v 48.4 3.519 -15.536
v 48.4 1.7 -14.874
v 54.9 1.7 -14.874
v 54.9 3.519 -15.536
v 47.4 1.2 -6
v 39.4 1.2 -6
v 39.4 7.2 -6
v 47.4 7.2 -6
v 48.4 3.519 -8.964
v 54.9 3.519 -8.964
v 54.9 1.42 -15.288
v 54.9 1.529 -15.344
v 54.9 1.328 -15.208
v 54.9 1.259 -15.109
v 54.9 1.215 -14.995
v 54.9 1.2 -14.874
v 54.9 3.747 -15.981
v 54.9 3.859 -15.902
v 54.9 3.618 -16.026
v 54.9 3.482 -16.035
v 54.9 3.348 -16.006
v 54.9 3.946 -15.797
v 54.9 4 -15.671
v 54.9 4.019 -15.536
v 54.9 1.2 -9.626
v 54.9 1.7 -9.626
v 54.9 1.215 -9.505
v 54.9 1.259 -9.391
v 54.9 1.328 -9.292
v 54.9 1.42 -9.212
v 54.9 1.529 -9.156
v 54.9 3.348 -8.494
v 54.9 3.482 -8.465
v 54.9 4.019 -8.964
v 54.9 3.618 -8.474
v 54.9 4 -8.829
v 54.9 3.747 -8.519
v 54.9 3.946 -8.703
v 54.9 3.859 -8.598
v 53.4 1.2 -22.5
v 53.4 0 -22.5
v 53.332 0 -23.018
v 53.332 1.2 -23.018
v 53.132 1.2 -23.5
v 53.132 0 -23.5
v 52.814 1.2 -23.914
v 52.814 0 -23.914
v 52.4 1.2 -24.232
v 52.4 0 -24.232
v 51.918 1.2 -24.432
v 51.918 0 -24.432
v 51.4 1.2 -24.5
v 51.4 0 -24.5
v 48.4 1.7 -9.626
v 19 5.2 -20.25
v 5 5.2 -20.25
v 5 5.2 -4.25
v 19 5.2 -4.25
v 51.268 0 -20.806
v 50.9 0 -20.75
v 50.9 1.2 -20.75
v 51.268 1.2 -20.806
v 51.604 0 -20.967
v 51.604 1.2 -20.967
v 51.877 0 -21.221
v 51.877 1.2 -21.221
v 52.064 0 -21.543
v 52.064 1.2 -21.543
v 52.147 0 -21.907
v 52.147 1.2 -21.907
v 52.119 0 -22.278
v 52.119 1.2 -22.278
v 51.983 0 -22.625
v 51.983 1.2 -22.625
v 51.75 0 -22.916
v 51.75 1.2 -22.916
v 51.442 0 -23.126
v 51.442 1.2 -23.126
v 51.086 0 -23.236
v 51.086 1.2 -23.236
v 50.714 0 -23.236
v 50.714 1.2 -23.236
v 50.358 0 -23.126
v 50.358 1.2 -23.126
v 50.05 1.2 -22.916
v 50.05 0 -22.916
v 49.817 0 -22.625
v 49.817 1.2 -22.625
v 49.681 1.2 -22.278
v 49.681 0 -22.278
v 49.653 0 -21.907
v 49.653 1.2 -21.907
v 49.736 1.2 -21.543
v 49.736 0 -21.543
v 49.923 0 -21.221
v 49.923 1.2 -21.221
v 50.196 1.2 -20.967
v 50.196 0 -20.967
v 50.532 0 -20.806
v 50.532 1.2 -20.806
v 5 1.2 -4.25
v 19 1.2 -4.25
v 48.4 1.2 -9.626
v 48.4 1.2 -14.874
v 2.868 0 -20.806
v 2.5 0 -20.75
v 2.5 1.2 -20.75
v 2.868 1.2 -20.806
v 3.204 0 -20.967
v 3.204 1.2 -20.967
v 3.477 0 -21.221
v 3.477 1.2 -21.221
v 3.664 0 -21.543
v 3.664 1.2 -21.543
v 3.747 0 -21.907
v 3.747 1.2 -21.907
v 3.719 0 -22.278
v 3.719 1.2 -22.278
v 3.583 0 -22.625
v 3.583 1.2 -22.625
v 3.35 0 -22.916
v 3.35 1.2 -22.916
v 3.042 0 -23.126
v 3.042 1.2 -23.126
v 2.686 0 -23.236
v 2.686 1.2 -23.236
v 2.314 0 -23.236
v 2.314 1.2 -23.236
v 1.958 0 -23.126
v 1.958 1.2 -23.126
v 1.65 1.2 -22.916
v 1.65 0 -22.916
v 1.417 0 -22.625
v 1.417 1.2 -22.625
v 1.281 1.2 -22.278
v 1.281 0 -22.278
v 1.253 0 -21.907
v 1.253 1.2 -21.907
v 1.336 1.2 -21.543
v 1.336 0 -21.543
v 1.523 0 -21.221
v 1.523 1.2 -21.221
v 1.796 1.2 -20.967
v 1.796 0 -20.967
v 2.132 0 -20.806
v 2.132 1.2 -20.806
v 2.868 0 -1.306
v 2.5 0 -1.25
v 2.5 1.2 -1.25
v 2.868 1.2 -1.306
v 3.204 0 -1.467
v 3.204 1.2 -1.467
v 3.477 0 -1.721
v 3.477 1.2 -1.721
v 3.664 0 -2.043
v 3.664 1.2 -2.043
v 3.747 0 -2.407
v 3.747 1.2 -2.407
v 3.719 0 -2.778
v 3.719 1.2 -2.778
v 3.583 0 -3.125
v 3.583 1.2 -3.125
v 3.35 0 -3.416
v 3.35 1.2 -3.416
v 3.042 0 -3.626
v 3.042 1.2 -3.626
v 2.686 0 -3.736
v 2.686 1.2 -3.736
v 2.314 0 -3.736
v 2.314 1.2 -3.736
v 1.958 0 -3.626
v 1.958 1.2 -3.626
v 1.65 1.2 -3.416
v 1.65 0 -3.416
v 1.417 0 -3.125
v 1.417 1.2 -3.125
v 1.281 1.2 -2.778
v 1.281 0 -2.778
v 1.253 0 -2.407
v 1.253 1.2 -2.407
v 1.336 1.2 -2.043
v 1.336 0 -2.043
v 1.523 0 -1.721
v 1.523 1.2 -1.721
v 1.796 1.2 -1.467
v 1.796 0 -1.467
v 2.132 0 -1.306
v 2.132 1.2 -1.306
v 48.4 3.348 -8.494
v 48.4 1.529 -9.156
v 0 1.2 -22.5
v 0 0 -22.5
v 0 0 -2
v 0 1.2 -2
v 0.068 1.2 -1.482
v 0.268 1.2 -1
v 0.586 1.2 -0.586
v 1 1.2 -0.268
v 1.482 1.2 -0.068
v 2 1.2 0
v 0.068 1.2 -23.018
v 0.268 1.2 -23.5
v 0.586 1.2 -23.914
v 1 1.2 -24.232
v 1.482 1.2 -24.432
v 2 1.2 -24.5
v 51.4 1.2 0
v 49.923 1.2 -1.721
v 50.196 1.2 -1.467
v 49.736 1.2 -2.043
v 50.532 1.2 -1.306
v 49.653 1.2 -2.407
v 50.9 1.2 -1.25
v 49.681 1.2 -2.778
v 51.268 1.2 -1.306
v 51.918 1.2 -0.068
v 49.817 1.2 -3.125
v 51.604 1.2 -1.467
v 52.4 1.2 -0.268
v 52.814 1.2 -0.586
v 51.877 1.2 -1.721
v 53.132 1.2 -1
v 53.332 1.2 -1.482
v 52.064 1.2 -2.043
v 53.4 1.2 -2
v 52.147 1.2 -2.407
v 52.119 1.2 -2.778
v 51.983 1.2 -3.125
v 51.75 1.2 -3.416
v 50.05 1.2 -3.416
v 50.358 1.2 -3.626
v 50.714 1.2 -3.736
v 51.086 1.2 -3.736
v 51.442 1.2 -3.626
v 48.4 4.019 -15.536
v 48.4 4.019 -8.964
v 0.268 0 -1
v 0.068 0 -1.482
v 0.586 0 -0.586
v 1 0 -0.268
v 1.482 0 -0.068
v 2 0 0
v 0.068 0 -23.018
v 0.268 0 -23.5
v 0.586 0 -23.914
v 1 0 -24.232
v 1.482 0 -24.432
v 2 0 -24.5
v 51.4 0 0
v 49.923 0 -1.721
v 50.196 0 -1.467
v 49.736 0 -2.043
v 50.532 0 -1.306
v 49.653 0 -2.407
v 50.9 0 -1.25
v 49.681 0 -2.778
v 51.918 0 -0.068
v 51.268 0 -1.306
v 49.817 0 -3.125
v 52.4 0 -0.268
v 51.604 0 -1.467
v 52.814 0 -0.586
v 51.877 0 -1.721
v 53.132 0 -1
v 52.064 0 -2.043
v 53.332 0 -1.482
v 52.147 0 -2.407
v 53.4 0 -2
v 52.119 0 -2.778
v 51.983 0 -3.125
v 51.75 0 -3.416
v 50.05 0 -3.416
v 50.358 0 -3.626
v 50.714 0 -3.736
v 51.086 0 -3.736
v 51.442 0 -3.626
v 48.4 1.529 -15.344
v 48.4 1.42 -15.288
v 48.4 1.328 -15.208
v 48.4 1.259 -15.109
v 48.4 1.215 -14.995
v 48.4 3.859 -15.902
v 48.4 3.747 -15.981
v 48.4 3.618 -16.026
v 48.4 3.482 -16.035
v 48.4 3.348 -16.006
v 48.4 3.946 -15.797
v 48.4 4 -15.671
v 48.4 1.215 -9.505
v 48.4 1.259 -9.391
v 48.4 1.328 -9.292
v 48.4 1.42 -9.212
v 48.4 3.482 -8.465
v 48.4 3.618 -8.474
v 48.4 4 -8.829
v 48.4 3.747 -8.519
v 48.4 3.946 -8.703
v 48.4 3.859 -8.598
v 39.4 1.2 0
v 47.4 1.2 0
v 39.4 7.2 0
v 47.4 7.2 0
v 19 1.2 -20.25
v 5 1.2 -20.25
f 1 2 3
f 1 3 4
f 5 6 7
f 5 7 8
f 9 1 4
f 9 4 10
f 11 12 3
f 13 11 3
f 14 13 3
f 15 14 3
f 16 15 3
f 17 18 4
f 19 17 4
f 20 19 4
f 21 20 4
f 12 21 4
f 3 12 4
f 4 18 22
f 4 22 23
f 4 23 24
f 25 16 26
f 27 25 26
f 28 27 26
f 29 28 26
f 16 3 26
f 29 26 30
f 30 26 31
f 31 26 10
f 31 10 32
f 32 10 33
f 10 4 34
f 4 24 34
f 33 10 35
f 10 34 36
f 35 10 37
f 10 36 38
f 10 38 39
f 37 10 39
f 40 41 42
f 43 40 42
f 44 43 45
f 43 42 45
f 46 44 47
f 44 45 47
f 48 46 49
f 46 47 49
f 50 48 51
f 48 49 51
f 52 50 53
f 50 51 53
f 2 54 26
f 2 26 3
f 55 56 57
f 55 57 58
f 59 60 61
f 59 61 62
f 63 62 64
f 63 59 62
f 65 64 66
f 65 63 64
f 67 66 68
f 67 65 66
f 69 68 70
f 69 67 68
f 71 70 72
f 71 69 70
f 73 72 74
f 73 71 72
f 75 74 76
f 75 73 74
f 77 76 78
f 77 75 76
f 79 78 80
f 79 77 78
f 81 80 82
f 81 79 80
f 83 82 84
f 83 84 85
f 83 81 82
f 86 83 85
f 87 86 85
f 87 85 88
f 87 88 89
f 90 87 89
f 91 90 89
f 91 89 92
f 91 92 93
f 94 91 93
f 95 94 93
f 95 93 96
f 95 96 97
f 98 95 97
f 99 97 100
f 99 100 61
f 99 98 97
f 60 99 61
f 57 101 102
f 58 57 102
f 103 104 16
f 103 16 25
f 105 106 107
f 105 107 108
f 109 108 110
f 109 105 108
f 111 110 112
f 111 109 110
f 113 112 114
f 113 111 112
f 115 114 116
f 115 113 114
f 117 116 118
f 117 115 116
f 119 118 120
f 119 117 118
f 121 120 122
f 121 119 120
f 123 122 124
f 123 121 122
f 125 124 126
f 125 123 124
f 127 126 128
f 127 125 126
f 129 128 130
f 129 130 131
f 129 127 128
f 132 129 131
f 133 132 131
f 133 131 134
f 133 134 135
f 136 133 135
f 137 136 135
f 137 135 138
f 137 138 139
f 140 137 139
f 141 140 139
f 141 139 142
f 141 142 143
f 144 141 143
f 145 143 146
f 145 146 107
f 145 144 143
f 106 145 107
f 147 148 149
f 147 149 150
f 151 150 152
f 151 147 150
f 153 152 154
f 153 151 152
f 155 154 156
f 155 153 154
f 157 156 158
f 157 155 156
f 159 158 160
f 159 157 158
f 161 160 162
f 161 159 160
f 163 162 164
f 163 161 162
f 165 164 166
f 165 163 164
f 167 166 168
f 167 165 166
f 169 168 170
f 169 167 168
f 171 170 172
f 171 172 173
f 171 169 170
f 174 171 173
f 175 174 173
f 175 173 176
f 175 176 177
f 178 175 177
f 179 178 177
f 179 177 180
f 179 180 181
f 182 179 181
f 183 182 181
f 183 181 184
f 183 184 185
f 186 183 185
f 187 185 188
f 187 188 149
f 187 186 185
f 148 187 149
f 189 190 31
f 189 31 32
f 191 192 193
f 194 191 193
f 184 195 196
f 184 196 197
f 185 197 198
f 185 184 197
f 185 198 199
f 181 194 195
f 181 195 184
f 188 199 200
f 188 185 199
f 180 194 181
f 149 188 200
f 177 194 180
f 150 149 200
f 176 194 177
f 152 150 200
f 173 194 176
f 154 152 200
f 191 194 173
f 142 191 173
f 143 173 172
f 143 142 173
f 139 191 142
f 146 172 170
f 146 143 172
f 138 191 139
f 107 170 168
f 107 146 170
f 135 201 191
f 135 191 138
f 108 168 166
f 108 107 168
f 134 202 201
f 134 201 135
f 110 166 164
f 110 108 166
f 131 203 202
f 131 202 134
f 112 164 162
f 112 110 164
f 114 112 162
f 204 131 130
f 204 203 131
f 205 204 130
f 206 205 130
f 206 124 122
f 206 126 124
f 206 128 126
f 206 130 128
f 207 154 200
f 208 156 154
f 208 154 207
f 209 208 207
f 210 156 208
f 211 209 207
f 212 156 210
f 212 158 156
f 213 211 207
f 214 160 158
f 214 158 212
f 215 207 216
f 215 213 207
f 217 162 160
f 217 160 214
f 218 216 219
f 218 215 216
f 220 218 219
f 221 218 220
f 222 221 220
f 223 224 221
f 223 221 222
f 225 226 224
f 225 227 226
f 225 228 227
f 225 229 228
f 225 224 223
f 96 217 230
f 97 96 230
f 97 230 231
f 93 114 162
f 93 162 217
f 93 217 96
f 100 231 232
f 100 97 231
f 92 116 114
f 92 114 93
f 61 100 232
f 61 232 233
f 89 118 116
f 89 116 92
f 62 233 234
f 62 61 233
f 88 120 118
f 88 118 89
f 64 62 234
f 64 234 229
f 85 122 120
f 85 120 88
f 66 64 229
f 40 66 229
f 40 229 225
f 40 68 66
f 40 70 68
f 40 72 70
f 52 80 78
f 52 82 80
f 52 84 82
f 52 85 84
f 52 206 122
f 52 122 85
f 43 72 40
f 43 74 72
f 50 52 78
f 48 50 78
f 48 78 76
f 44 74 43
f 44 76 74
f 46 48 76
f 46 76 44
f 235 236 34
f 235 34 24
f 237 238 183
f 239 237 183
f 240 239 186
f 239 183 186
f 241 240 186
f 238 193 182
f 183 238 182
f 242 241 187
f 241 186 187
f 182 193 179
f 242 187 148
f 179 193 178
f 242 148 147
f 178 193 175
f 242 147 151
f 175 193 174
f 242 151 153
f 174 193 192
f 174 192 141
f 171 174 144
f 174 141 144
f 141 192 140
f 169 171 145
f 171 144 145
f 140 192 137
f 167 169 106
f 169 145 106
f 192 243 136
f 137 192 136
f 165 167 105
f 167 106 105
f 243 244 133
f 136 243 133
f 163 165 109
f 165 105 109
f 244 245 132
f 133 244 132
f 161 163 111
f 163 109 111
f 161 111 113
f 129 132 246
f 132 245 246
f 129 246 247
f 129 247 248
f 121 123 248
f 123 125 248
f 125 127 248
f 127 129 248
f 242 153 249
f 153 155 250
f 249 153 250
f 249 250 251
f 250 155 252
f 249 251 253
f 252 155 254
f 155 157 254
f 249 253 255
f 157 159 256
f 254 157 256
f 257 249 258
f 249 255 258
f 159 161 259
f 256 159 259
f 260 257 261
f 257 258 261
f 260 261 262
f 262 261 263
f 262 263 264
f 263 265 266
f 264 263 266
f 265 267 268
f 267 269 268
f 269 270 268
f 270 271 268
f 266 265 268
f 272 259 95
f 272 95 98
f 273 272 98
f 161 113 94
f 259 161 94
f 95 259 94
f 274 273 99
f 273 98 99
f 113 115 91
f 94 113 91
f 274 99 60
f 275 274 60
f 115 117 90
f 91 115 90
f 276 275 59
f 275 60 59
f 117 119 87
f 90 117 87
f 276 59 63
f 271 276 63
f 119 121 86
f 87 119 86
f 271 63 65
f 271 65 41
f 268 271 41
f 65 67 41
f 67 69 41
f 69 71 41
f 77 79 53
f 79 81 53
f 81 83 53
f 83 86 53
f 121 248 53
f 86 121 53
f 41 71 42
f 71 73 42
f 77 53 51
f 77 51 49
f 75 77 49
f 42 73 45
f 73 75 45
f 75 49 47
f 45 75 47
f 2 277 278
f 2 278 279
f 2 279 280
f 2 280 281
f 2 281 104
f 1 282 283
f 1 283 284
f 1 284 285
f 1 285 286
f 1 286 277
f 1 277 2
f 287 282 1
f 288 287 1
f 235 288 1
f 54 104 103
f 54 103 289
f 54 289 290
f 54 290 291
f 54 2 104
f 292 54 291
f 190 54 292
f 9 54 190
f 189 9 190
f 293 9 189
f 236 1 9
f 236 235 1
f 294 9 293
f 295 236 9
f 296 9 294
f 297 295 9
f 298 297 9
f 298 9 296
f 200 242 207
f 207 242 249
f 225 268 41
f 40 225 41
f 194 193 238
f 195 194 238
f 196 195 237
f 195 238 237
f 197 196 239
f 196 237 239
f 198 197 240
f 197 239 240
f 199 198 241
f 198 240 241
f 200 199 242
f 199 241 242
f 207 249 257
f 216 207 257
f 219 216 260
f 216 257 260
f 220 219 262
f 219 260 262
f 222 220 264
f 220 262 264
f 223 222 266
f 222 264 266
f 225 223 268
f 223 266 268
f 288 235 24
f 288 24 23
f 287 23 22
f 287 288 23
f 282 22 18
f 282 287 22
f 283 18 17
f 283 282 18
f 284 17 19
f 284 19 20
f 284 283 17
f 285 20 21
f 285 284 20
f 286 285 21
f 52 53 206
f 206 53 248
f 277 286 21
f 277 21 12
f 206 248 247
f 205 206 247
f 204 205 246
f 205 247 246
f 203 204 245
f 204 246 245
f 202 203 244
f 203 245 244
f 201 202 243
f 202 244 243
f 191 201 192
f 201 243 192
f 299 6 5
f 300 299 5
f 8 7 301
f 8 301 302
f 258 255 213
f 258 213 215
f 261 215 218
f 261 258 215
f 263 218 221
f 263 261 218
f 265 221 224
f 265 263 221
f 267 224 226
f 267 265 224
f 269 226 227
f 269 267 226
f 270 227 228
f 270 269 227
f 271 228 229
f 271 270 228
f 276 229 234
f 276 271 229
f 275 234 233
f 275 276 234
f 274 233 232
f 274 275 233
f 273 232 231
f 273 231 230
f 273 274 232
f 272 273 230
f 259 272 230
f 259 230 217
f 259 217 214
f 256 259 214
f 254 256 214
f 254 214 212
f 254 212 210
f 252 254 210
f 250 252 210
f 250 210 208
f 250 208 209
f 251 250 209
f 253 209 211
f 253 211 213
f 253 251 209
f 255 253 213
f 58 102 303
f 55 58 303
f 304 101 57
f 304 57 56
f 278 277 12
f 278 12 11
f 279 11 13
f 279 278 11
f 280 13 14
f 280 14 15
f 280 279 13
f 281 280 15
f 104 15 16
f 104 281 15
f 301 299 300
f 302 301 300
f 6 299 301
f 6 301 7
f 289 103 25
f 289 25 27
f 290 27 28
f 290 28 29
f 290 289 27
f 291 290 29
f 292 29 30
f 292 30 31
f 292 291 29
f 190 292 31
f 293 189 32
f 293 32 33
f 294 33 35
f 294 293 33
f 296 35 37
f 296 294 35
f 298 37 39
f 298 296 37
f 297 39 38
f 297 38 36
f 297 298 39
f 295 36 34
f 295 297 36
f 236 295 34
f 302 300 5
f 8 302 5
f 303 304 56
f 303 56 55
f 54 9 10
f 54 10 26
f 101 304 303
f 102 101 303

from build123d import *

# Parameters (mm, degrees)
SKETCH1_R                = 1.25
BOSS_EXTRUDE1_DEPTH      = 1.2
BOSS_EXTRUDE2_DEPTH      = 1.5
BOSS_EXTRUDE2_DEPTH_BACK = 5
SKETCH3_W                = 14
SKETCH3_H                = 16
BOSS_EXTRUDE3_DEPTH      = 4
SKETCH4_W                = 8
SKETCH4_H                = 6
BOSS_EXTRUDE4_DEPTH      = 6


with BuildPart() as part:
    # Sketch1 → Boss-Extrude1 (new body)
    with BuildSketch(Plane(origin=(0, 0, 0), x_dir=(1, 0, 0), z_dir=(0, 1, 0))):
        with BuildLine():
            Line((2, 0), (51.4, 0))
            ThreePointArc((51.4, 0), (52.814213562, 0.585786438), (53.4, 2))
            Line((53.4, 2), (53.4, 22.5))
            ThreePointArc((53.4, 22.5), (52.814213562, 23.914213562), (51.4, 24.5))
            Line((51.4, 24.5), (2, 24.5))
            ThreePointArc((2, 24.5), (0.585786438, 23.914213562), (0, 22.5))
            Line((0, 22.5), (0, 2))
            ThreePointArc((0, 2), (0.585786438, 0.585786438), (2, 0))
        make_face()
        with Locations(Location((2.5, 22, 0), (0, 0, 270))):
            Circle(SKETCH1_R, mode=Mode.SUBTRACT)
        with Locations(Location((50.9, 22, 0), (0, 0, 270))):
            Circle(SKETCH1_R, mode=Mode.SUBTRACT)
        with Locations(Location((50.9, 2.5, 0), (0, 0, 270))):
            Circle(SKETCH1_R, mode=Mode.SUBTRACT)
        with Locations(Location((2.5, 2.5, 0), (0, 0, 270))):
            Circle(SKETCH1_R, mode=Mode.SUBTRACT)
    extrude(amount=BOSS_EXTRUDE1_DEPTH)


with BuildPart() as body_2:
    # Sketch2 → Boss-Extrude2 (new, two sides: drawn at the far end of the back side and taken through both)
    with BuildSketch(Plane(origin=(53.4, 0, 0), x_dir=(0, 0, -1), z_dir=(1, 0, 0)).offset(-BOSS_EXTRUDE2_DEPTH_BACK)):
        with BuildLine():
            Line((8.964074003, 4.019077862), (15.535925997, 4.019077862))
            ThreePointArc((15.535925997, 4.019077862), (15.945502019, 3.805866081), (16.005772307, 3.348067791))
            Line((16.005772307, 3.348067791), (15.343682111, 1.528989928))
            ThreePointArc((15.343682111, 1.528989928), (15.160624019, 1.290423978), (14.873835801, 1.2))
            Line((14.873835801, 1.2), (9.626164199, 1.2))
            ThreePointArc((9.626164199, 1.2), (9.339375981, 1.290423978), (9.156317889, 1.528989928))
            Line((9.156317889, 1.528989928), (8.494227693, 3.348067791))
            ThreePointArc((8.494227693, 3.348067791), (8.554497981, 3.805866081), (8.964074003, 4.019077862))
        make_face()
        Polygon((8.964074003, 3.519077862), (9.626164199, 1.7), (14.873835801, 1.7), (15.535925997, 3.519077862), align=None, mode=Mode.SUBTRACT)
    extrude(amount=BOSS_EXTRUDE2_DEPTH + BOSS_EXTRUDE2_DEPTH_BACK)


with BuildPart() as body_3:
    # Sketch3 → Boss-Extrude3 (new body)
    with BuildSketch(Plane(origin=(0, 1.2, 0), x_dir=(1, 0, 0), z_dir=(0, 1, 0))):
        with Locations((12, 12.25)):
            Rectangle(SKETCH3_W, SKETCH3_H)
    extrude(amount=BOSS_EXTRUDE3_DEPTH)


with BuildPart() as body_4:
    # Sketch4 → Boss-Extrude4 (new body)
    with BuildSketch(Plane(origin=(0, 1.2, 0), x_dir=(1, 0, 0), z_dir=(0, 1, 0))):
        with Locations((43.4, 3)):
            Rectangle(SKETCH4_W, SKETCH4_H)
    extrude(amount=BOSS_EXTRUDE4_DEPTH)


solid = Compound([part.part, body_2.part, body_3.part, body_4.part])
